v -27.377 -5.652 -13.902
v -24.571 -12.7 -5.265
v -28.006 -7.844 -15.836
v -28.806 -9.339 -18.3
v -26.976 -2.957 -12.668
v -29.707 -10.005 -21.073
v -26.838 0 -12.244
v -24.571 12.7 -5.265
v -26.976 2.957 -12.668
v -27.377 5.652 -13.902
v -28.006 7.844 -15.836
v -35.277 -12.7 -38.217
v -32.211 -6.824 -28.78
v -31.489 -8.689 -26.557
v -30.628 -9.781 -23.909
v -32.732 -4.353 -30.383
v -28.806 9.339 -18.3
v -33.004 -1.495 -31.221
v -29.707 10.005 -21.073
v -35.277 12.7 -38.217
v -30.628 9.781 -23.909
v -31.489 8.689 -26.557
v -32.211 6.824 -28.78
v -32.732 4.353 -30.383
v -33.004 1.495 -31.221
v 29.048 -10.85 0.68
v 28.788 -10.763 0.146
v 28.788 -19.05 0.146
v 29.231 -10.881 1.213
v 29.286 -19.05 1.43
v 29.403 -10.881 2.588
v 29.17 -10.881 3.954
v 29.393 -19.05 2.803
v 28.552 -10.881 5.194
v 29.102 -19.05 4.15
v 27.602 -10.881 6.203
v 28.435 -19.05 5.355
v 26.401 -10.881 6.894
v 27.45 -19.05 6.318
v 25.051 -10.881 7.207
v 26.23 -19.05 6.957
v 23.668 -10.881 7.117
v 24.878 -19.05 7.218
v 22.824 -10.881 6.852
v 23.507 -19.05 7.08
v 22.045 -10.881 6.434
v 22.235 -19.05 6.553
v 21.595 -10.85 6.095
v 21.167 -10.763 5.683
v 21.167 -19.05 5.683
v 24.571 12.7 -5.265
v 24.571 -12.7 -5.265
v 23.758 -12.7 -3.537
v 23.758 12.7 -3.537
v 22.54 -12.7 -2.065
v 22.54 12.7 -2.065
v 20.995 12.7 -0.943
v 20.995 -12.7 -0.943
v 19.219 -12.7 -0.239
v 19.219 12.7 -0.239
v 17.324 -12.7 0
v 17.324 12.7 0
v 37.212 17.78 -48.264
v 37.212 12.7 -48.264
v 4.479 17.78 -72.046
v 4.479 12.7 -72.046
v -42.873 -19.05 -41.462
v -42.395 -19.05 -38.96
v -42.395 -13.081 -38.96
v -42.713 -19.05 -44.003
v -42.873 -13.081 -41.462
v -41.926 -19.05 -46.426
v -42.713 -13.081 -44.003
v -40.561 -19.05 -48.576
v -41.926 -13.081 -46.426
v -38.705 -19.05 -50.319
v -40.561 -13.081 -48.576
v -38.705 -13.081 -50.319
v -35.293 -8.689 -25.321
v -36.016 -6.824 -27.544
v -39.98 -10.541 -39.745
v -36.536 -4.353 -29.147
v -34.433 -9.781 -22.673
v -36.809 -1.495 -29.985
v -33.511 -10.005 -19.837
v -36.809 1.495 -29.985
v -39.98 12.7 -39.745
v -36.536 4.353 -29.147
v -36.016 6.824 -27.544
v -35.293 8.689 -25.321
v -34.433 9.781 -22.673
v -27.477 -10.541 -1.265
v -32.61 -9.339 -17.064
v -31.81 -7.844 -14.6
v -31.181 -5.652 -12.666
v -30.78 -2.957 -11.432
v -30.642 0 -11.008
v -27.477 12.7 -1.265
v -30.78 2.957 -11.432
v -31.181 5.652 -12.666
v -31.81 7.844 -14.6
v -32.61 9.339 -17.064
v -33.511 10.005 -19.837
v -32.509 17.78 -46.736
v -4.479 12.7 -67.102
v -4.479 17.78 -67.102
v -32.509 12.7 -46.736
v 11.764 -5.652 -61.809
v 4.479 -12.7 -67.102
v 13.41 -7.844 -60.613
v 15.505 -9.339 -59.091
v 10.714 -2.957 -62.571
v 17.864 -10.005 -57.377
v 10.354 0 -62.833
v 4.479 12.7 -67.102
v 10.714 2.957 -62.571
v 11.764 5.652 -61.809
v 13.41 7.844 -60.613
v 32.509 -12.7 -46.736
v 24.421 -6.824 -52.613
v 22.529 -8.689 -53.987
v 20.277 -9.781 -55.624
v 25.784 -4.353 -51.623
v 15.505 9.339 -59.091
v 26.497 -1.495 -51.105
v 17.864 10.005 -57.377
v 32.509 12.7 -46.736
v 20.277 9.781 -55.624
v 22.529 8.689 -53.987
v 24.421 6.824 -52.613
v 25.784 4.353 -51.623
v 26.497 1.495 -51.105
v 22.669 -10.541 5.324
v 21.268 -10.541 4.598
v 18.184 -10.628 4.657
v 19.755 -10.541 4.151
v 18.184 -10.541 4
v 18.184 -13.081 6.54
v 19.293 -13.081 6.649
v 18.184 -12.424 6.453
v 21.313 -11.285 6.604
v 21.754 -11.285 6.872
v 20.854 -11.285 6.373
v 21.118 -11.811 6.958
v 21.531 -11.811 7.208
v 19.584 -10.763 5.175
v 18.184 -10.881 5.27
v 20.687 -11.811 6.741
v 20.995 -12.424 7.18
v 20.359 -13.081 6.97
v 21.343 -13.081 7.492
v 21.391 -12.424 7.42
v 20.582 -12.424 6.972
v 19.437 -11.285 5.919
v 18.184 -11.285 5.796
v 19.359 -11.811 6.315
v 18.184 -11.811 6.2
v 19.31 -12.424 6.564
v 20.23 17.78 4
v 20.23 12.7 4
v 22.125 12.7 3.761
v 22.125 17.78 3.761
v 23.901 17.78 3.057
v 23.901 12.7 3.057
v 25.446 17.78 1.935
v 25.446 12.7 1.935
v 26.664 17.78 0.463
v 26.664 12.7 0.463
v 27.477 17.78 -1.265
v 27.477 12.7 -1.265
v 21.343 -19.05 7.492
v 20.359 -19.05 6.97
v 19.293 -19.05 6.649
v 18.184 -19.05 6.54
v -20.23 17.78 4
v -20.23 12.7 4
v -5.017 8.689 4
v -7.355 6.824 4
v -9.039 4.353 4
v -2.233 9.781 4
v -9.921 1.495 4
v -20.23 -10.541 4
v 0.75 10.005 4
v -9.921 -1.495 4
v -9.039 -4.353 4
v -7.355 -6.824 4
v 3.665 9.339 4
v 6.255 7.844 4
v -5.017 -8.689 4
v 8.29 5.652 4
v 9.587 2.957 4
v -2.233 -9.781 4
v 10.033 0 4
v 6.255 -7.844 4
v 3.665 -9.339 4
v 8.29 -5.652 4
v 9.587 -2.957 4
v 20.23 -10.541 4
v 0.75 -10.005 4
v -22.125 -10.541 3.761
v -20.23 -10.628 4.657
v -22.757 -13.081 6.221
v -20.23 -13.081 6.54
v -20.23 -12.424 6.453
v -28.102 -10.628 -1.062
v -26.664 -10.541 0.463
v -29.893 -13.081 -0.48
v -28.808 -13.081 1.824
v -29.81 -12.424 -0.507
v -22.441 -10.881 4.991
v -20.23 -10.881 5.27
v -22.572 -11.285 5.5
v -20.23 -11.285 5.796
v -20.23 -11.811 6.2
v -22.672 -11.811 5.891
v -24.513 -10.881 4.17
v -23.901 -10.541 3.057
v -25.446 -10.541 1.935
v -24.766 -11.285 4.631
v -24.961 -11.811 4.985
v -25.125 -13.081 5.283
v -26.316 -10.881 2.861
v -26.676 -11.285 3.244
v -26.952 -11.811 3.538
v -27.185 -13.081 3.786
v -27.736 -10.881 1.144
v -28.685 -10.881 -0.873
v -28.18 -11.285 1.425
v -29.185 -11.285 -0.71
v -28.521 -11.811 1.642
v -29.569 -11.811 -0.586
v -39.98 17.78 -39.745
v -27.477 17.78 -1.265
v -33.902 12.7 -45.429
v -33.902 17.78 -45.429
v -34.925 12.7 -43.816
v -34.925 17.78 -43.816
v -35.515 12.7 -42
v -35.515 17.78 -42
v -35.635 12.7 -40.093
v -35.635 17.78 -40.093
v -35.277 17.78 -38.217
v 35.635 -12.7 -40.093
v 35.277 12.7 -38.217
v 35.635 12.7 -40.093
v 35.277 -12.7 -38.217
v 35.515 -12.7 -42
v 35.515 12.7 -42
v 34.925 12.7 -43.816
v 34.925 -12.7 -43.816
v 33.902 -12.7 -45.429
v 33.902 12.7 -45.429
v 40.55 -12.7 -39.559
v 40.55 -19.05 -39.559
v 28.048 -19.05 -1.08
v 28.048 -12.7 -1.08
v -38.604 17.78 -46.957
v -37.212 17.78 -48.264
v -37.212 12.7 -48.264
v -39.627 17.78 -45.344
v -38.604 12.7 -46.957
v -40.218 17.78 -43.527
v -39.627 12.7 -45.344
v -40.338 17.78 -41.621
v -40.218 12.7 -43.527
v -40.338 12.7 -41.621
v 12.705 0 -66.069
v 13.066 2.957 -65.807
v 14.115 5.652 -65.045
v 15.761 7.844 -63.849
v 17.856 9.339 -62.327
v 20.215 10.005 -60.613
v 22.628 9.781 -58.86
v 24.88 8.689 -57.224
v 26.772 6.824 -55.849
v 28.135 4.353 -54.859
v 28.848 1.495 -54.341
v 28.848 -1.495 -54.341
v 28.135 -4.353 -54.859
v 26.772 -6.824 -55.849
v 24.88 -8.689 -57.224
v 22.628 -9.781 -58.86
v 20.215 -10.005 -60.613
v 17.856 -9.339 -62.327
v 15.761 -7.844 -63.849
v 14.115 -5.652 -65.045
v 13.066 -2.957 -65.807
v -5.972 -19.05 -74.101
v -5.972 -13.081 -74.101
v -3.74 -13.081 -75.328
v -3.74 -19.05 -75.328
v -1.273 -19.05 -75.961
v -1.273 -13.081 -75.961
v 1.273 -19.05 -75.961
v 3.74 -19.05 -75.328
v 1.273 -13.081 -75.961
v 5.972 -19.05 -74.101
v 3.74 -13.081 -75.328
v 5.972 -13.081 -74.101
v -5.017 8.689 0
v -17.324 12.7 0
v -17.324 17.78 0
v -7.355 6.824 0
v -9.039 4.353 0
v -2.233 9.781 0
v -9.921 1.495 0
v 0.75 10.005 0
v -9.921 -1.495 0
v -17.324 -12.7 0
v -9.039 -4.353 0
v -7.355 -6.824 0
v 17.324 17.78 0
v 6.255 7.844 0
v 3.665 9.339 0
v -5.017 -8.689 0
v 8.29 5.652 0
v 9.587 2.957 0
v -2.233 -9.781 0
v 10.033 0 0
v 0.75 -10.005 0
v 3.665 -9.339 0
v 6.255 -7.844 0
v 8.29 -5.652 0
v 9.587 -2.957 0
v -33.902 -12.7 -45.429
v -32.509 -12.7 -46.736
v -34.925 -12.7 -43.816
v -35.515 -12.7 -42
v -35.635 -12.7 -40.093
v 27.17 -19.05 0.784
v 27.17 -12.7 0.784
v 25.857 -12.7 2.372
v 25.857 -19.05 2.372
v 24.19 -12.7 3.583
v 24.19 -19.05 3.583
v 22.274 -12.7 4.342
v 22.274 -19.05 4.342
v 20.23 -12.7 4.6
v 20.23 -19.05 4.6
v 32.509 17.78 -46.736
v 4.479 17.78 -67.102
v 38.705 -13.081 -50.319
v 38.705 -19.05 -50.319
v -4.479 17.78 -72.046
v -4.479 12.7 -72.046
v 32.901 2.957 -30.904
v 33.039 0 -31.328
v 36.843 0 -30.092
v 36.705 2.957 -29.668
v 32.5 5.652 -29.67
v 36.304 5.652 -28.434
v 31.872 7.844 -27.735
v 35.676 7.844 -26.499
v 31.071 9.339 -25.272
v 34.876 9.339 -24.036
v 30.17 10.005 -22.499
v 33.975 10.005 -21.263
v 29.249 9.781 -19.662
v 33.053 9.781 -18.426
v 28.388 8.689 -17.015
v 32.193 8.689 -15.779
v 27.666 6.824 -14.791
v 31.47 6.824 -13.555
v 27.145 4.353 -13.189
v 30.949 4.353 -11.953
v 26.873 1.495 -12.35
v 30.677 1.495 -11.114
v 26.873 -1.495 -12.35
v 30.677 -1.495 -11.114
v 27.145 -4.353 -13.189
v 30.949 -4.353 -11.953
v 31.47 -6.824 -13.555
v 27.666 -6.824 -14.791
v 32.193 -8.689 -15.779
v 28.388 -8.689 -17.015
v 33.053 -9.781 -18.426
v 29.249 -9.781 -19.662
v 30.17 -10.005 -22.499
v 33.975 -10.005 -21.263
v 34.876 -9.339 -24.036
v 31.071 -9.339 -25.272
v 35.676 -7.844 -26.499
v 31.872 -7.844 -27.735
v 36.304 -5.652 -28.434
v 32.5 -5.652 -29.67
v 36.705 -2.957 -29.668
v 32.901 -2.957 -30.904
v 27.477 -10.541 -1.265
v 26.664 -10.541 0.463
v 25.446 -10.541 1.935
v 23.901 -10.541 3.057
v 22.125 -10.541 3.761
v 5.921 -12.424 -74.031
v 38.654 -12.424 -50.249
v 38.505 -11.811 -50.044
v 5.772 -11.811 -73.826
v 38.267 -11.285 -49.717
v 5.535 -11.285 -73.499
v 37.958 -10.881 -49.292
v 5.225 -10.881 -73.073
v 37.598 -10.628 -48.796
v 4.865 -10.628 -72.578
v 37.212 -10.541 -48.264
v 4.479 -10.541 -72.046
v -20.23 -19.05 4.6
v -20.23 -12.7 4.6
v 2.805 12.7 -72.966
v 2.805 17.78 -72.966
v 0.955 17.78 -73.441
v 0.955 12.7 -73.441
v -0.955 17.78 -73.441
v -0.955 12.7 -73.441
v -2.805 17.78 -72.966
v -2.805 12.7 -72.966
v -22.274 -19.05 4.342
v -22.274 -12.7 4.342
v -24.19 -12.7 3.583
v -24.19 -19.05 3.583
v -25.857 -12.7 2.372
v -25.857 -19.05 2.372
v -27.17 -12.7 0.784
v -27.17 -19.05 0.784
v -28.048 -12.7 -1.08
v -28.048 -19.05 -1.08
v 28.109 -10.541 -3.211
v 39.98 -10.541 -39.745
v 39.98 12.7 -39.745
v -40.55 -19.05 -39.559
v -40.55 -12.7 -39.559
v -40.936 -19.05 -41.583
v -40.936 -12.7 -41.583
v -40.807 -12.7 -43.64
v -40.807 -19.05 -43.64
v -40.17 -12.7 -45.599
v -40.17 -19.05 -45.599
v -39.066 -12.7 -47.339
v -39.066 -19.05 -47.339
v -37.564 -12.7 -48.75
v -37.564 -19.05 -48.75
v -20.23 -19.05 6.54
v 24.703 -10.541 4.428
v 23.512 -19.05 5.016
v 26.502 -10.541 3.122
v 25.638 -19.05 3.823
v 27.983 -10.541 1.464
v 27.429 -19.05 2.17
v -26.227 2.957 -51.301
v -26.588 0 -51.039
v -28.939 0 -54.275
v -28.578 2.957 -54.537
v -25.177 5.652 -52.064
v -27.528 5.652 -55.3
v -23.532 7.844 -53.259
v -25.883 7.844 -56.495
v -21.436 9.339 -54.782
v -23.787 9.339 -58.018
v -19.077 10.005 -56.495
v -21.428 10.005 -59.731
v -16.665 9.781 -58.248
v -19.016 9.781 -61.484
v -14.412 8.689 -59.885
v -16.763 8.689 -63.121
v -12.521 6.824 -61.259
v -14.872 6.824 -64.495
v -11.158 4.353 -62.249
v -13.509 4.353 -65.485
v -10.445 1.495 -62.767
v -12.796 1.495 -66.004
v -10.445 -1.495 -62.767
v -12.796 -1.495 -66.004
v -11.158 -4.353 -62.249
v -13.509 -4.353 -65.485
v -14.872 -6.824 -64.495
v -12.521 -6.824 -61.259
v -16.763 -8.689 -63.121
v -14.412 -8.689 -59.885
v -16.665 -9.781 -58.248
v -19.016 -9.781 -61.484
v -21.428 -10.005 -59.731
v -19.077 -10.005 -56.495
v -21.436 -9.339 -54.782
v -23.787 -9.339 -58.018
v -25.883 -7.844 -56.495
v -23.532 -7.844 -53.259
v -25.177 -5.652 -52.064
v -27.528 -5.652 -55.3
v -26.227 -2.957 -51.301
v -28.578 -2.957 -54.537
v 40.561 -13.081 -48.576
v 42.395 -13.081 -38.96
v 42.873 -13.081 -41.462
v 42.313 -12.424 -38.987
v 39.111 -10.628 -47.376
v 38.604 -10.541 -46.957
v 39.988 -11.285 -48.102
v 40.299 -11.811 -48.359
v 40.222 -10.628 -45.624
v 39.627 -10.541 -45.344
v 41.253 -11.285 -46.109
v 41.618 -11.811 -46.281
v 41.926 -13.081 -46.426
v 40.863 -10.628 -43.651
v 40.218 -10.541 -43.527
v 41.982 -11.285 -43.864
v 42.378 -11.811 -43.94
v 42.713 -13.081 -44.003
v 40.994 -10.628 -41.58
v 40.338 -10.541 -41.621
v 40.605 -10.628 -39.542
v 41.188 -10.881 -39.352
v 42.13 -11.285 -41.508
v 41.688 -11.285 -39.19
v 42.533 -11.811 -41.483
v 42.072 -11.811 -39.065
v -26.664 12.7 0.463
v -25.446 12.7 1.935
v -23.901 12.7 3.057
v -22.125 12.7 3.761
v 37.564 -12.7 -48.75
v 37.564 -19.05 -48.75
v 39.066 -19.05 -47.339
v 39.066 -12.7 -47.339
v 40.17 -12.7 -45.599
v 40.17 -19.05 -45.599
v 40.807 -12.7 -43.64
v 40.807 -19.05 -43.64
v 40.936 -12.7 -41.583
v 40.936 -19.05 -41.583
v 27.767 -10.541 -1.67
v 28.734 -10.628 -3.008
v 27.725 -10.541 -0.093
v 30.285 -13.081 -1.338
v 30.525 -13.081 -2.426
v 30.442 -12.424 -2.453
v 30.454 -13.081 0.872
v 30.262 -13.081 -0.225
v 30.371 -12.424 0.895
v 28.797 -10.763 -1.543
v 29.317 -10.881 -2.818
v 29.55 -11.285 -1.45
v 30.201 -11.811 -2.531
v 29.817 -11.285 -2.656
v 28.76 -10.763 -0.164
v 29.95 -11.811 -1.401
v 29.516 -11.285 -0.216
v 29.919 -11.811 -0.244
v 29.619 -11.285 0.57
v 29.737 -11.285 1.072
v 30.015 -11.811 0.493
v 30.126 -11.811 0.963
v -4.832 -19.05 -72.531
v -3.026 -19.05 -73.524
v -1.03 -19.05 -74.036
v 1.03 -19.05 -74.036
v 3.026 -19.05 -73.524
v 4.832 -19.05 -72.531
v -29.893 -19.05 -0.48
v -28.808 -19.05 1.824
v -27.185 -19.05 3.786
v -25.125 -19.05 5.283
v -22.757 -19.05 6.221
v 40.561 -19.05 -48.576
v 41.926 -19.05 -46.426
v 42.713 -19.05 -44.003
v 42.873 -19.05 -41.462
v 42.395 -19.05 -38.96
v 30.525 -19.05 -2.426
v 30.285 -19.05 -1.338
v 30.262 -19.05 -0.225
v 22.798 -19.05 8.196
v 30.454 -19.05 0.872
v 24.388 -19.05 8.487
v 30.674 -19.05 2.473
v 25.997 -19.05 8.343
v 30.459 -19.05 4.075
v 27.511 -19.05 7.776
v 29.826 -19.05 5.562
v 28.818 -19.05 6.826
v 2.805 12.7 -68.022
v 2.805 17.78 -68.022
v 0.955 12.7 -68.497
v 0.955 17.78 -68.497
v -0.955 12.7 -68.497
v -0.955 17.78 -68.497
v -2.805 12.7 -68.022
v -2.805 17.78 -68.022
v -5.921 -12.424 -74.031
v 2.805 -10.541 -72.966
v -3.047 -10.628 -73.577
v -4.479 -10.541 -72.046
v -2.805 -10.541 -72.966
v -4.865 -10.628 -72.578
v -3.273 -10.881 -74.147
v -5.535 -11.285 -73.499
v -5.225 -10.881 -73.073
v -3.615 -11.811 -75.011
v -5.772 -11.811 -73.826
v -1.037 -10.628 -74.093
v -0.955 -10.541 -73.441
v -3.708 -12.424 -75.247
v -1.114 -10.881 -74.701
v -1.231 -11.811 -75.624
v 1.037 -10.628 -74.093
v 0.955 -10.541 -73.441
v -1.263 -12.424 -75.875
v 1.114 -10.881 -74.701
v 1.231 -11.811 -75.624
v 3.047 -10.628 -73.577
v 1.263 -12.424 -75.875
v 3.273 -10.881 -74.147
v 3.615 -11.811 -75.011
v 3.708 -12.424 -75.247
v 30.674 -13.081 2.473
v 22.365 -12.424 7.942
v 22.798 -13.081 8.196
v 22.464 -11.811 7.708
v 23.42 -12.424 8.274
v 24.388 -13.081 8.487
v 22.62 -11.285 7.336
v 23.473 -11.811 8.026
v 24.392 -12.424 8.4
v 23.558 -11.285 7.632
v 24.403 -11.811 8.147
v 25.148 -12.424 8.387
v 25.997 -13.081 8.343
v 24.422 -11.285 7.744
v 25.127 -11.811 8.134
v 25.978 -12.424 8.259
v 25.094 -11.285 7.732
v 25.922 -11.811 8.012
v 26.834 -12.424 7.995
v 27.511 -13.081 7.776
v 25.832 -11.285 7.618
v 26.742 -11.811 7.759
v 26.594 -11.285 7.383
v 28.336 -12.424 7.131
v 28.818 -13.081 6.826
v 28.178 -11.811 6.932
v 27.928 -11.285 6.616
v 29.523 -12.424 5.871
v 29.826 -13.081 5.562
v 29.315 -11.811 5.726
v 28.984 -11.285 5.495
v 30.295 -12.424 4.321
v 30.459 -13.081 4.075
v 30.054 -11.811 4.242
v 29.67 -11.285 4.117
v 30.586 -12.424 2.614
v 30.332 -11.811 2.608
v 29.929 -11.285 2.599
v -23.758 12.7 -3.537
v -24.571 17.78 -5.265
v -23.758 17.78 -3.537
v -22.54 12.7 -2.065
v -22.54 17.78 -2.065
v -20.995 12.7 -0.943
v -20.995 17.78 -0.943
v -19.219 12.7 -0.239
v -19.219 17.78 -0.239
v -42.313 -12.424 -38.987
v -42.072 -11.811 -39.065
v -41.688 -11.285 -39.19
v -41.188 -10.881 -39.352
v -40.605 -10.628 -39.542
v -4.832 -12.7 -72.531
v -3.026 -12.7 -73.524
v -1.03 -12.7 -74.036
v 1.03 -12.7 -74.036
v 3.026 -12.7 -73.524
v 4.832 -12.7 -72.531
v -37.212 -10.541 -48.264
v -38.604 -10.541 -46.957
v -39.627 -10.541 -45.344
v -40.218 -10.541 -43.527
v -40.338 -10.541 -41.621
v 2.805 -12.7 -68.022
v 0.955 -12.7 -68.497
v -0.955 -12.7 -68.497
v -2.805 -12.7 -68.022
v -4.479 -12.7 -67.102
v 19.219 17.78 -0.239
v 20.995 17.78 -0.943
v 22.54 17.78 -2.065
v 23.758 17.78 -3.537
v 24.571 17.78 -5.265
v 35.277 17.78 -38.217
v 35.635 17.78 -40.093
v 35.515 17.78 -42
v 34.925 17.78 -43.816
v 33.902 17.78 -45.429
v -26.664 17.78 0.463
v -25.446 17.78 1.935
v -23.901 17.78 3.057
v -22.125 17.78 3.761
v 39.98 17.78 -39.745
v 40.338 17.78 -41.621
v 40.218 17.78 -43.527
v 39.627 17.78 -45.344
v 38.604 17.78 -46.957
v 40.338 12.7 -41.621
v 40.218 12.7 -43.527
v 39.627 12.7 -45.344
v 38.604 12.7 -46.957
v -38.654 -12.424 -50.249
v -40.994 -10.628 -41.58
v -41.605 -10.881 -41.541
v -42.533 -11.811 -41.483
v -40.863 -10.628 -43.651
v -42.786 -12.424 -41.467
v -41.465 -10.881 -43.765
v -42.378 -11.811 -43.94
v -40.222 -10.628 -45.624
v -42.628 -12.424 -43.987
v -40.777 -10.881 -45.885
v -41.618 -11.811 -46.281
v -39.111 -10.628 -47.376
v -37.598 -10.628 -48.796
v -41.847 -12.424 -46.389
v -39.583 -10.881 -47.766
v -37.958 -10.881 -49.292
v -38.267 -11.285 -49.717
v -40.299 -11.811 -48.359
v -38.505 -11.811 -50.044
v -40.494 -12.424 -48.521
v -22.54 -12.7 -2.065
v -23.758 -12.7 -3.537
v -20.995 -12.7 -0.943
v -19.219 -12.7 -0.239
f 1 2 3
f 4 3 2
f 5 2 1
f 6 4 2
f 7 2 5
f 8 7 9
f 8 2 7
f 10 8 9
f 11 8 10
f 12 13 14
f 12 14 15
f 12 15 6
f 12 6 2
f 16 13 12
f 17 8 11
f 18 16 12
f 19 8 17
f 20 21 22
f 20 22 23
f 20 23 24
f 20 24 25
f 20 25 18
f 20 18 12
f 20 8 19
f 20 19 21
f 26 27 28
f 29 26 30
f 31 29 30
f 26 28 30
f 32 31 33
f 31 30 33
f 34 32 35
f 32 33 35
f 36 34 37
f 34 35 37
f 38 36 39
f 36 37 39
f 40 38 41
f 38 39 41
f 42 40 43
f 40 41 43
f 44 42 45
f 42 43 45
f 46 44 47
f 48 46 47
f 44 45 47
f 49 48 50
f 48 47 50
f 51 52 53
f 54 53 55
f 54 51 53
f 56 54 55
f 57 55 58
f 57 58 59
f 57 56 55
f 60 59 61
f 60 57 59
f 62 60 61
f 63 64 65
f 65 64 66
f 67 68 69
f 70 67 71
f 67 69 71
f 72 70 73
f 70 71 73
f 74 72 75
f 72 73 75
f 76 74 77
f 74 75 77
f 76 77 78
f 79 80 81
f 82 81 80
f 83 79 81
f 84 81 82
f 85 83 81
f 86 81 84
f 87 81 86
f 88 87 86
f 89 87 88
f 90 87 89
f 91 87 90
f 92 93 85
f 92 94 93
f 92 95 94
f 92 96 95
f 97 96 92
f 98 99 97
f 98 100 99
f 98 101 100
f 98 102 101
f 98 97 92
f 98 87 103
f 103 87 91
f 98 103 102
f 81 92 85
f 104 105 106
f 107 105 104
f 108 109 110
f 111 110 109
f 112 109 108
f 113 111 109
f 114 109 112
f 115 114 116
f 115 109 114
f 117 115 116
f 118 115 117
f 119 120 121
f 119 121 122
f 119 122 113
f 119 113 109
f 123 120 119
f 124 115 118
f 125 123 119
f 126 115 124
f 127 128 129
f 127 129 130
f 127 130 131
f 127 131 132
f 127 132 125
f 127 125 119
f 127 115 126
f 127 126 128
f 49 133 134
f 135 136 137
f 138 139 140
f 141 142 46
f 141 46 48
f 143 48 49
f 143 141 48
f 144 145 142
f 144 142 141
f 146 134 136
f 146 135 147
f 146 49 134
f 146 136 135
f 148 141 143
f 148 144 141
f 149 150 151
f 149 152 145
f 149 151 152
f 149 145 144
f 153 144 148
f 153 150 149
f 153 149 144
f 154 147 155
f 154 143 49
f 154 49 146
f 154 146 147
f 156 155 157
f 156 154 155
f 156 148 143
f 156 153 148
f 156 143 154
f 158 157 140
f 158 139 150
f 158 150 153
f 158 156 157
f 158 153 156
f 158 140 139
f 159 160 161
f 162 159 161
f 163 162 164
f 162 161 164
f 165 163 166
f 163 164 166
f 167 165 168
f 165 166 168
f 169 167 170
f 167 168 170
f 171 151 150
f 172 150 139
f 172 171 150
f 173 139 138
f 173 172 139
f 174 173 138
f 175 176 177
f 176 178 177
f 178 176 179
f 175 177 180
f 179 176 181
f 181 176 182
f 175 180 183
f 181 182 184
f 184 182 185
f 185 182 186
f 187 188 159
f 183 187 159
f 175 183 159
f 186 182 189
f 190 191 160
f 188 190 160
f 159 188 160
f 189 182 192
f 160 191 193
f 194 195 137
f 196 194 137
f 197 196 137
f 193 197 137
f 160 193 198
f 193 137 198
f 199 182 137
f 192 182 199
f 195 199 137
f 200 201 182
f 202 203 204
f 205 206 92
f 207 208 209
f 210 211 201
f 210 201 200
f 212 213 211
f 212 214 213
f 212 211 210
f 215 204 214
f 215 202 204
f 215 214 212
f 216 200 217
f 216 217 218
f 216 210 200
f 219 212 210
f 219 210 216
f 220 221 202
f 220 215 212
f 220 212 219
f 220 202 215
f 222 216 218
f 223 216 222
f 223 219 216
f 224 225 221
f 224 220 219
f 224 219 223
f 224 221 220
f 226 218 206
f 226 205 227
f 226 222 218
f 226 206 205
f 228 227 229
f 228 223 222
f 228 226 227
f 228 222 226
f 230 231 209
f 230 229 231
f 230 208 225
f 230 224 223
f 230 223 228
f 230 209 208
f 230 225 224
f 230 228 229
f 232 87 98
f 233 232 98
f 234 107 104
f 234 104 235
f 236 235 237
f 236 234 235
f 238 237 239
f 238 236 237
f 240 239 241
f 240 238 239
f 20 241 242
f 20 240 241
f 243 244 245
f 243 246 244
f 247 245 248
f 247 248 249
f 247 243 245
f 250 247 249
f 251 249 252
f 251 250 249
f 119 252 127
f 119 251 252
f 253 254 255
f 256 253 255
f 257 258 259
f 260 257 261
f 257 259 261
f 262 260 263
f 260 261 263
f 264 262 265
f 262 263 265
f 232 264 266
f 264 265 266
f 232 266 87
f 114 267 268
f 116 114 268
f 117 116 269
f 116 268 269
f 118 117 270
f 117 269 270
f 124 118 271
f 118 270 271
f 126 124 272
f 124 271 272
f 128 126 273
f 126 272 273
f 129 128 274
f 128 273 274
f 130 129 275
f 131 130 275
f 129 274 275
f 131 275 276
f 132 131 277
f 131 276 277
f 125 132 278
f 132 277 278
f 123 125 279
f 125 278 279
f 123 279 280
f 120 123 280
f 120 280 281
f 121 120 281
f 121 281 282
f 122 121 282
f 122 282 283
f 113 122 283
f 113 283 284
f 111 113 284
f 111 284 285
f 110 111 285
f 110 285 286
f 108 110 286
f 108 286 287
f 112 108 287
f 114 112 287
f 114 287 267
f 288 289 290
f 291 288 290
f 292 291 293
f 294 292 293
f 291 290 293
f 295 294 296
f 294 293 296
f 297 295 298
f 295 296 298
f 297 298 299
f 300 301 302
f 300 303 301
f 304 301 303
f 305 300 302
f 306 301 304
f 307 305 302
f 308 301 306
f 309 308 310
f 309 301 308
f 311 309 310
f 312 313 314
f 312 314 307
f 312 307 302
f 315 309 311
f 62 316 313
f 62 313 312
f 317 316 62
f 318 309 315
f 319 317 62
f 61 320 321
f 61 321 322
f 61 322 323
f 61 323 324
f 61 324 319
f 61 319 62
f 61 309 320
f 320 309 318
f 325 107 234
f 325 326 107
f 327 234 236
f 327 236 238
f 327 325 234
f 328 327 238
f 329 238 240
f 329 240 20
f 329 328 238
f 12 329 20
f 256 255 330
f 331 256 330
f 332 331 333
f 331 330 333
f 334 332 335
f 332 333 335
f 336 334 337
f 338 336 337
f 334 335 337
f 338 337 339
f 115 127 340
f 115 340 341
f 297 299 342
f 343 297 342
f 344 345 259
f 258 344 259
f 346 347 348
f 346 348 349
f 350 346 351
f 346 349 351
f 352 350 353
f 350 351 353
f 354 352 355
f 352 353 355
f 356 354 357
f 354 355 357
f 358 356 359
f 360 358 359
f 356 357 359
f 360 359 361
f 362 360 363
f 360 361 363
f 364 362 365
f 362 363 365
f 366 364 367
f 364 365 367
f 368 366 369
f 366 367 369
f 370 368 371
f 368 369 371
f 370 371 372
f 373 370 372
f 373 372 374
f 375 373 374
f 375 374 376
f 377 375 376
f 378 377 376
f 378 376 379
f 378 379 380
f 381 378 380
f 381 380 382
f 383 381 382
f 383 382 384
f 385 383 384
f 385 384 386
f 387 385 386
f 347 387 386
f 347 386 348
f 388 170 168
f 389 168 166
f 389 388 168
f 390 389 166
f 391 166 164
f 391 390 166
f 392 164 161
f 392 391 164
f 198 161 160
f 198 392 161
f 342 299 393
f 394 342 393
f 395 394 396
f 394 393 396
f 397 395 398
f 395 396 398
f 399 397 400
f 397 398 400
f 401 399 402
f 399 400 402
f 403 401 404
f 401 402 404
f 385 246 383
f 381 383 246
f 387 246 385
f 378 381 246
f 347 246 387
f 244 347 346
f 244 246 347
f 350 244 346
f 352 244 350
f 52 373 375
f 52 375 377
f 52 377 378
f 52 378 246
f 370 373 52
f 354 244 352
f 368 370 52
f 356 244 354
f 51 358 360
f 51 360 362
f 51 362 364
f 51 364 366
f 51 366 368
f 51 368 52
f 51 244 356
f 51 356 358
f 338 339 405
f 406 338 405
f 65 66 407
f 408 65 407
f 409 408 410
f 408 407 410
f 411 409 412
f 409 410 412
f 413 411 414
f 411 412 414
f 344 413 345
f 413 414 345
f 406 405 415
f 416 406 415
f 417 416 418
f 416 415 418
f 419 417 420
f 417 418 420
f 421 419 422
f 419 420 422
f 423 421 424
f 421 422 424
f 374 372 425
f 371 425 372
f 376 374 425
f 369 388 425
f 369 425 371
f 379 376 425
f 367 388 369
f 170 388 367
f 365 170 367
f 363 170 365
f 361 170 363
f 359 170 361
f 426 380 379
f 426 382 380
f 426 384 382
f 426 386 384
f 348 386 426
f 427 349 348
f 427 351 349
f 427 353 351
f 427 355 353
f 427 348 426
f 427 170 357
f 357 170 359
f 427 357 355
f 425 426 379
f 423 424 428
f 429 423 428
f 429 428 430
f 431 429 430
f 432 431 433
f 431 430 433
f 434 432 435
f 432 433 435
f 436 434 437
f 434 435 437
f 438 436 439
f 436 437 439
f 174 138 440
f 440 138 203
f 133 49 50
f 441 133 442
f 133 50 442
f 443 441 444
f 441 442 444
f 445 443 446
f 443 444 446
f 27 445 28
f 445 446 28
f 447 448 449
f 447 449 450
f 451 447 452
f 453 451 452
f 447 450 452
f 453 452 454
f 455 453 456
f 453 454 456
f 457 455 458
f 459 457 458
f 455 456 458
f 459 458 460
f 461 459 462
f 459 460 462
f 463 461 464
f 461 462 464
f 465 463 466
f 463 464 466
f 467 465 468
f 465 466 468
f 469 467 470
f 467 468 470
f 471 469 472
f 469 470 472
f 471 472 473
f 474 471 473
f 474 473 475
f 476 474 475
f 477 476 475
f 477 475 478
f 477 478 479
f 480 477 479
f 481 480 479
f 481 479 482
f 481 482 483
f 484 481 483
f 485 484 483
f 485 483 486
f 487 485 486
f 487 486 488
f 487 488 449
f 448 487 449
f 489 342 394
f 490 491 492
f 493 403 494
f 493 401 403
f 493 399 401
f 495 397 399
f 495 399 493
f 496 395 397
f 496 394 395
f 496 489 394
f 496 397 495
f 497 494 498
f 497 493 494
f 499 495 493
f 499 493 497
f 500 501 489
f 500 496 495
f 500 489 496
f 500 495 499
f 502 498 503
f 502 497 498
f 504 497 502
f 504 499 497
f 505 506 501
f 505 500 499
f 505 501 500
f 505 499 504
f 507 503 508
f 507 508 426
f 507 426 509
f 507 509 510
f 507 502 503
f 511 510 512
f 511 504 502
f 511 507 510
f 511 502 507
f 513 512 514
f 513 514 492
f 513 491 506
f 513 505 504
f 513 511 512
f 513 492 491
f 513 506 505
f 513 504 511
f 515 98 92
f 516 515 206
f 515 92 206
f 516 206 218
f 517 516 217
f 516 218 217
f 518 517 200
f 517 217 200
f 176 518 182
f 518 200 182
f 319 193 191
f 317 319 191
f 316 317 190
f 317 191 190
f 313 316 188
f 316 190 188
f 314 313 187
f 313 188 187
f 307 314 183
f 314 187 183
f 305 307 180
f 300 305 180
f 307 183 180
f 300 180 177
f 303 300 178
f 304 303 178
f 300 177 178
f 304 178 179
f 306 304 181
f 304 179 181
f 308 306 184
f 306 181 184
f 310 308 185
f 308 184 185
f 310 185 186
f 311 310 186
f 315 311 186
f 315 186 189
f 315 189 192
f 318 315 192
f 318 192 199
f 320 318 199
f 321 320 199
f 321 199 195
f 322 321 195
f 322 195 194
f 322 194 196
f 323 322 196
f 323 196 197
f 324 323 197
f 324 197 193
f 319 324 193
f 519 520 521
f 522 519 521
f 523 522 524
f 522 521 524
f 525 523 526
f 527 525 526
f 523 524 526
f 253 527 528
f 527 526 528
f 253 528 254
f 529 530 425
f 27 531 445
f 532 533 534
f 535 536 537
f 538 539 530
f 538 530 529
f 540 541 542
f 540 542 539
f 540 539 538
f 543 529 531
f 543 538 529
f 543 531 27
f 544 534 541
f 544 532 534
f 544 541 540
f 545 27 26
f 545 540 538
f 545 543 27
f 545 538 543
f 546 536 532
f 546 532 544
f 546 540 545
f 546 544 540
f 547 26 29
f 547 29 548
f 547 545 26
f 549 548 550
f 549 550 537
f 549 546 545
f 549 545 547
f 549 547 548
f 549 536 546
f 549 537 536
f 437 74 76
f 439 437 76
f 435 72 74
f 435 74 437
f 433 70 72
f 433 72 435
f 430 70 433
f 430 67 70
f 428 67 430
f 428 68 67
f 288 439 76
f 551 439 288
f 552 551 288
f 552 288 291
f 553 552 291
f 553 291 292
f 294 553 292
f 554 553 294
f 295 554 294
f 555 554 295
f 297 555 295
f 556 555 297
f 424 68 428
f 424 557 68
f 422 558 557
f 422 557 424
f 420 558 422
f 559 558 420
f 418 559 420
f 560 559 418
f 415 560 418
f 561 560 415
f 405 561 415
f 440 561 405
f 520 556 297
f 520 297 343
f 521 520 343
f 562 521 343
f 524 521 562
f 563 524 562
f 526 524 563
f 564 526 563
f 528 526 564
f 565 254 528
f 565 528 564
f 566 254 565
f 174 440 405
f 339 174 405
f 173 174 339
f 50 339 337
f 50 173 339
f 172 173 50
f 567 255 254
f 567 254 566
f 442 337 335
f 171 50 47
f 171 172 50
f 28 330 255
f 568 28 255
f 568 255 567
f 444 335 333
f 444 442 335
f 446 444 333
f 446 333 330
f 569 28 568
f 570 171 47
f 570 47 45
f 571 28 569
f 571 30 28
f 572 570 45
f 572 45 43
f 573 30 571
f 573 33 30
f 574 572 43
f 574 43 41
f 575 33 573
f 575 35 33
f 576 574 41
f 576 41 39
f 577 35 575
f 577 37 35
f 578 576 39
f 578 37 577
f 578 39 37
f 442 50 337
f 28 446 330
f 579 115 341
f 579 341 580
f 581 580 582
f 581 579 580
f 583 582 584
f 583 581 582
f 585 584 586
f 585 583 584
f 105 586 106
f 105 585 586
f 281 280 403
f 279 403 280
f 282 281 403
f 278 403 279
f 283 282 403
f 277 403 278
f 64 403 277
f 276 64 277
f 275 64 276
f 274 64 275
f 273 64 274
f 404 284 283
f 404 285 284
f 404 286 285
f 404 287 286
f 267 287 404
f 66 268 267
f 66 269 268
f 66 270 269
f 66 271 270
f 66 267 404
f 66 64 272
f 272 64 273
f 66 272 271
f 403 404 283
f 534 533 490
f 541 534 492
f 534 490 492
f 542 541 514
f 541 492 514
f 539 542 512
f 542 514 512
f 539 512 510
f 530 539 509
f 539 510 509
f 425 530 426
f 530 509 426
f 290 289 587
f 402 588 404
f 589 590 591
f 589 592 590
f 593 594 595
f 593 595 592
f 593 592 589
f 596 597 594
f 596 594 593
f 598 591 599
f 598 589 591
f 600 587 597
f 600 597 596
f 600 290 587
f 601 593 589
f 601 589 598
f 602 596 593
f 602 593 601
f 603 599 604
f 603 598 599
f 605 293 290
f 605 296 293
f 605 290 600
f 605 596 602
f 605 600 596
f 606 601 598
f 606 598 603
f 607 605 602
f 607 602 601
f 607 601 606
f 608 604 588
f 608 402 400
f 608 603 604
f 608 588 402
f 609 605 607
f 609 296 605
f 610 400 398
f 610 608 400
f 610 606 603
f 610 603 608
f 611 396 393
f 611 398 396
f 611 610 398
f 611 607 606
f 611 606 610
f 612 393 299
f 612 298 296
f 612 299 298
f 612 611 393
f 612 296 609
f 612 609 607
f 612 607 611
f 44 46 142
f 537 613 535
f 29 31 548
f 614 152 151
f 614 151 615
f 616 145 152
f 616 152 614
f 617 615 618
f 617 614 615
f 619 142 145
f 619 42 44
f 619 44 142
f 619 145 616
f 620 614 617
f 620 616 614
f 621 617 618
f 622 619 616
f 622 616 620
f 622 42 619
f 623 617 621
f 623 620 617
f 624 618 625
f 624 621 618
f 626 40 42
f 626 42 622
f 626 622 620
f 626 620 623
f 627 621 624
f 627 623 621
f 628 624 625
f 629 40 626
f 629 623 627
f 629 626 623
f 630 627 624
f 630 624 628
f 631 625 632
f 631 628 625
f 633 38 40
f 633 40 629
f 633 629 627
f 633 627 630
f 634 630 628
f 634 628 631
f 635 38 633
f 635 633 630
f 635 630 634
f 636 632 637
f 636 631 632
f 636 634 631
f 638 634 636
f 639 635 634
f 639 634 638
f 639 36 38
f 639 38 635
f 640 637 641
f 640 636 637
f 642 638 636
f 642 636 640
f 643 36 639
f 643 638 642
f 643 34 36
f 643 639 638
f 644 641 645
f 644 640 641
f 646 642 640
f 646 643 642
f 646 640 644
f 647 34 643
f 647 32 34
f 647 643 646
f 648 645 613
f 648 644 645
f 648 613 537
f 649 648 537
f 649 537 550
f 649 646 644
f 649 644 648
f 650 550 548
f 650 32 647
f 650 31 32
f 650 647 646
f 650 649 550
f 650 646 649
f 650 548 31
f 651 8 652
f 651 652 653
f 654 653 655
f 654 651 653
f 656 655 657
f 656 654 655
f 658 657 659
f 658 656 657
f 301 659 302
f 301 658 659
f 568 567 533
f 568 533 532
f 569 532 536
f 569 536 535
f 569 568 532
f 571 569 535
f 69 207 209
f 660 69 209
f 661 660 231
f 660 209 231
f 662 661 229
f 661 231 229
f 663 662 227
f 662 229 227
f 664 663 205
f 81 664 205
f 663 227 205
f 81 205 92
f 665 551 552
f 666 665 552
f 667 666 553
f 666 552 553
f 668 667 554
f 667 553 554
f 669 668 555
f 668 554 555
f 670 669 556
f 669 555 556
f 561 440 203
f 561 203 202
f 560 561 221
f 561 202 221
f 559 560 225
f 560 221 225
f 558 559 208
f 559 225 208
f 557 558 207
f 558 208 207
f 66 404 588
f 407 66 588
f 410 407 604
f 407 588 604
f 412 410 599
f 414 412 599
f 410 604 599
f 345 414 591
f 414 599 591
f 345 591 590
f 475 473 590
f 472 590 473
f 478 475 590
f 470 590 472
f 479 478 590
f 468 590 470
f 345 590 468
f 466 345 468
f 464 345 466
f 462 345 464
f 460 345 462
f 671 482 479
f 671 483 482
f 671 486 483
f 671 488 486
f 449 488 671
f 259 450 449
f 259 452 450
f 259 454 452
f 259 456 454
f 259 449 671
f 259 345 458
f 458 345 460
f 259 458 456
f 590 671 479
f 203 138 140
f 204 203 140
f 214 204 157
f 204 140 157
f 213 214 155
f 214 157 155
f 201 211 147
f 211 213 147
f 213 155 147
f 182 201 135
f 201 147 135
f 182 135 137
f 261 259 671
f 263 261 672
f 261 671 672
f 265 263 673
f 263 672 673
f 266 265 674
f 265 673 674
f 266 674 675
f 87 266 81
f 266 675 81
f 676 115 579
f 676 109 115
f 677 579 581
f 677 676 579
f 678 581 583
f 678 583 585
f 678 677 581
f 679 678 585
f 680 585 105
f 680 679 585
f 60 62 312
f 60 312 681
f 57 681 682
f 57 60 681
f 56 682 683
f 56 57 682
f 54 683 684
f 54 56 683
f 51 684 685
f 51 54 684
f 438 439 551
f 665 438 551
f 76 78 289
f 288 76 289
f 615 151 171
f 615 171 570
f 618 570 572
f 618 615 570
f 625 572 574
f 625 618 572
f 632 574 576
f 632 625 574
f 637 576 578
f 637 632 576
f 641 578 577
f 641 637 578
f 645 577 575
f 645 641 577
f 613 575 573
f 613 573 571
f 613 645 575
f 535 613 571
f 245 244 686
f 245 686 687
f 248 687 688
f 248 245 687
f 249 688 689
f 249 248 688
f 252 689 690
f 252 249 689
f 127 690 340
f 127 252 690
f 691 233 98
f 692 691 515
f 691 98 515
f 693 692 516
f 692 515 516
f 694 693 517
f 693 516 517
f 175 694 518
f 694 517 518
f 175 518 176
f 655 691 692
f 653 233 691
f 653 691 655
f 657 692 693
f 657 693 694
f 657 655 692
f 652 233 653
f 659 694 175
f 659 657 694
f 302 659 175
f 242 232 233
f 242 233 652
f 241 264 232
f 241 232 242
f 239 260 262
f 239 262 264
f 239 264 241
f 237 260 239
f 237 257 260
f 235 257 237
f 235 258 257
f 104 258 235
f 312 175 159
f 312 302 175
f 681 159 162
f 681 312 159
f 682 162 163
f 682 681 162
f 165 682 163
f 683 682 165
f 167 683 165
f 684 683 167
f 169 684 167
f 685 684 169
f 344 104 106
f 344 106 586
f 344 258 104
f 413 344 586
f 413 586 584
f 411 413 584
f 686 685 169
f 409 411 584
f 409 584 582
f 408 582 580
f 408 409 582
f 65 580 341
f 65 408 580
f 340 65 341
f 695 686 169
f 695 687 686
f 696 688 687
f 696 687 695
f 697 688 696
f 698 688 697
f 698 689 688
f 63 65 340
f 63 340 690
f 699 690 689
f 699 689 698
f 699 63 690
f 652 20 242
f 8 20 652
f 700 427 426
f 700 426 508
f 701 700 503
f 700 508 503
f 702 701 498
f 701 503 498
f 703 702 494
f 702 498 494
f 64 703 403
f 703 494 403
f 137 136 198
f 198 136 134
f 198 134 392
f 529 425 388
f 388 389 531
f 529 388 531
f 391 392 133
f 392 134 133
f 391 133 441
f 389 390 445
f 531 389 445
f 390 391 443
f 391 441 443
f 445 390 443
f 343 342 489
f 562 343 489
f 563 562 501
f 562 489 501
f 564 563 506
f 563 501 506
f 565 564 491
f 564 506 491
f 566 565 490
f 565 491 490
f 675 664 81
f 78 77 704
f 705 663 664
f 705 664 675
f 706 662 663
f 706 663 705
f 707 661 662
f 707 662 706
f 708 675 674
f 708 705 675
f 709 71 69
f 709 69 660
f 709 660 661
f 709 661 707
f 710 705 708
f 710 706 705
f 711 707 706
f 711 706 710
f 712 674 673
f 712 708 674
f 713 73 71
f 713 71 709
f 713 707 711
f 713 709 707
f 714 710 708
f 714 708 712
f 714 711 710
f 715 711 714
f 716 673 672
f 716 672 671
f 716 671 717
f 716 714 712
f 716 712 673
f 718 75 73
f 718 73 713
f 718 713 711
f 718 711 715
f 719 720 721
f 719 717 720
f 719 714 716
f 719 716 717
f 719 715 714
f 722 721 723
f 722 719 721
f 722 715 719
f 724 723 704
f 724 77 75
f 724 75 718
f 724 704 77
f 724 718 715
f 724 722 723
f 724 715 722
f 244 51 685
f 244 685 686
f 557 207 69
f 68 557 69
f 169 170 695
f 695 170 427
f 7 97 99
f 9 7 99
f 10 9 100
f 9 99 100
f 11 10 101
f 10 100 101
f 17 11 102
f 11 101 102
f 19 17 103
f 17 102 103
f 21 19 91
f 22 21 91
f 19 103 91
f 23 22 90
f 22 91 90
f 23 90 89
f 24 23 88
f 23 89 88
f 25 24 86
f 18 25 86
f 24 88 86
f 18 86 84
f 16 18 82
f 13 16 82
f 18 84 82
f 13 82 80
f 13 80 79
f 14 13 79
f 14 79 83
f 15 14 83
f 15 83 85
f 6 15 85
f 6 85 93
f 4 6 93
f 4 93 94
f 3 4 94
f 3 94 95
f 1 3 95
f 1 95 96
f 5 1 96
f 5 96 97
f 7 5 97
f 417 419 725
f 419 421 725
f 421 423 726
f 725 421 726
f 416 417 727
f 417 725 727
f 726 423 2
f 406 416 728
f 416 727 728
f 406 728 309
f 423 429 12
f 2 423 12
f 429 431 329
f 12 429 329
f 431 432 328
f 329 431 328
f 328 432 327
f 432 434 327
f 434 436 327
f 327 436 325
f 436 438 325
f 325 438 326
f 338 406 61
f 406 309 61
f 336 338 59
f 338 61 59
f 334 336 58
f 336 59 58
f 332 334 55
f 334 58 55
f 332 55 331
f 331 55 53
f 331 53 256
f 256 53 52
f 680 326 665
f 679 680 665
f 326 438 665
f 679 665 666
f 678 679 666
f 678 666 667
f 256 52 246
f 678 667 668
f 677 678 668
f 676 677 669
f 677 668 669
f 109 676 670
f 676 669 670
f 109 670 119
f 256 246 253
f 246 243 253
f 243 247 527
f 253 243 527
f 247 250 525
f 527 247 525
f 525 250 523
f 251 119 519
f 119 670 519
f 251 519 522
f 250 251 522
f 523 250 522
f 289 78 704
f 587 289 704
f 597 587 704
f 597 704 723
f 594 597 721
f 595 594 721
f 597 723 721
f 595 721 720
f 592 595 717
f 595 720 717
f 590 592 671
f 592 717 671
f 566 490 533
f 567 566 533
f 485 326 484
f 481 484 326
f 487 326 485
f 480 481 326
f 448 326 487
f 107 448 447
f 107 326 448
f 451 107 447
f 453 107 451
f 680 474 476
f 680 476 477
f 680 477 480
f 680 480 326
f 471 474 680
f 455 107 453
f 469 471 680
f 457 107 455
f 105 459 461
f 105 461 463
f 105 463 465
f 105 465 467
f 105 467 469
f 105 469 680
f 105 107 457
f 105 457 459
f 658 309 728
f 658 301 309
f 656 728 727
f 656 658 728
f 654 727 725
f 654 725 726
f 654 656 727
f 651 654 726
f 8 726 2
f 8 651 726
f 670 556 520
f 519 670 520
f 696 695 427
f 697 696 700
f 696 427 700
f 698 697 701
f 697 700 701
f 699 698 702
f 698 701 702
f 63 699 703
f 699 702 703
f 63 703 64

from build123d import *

# Parameters (mm, degrees)
SKETCH1_W                = 45.72
SKETCH1_H                = 25.4
SKETCH1_R                = 9.75
BOSS_EXTRUDE1_DEPTH      = 4
BOSS_EXTRUDE2_DEPTH      = 25.4
SKETCH3_R                = 10.033
CUT_EXTRUDE1_DEPTH       = 11.62
CIRPATTERN1_COUNT        = 5
FILLET1_R                = 7.62
BOSS_EXTRUDE3_DEPTH      = 5.08
BOSS_EXTRUDE4_DEPTH      = 6.35
BOSS_EXTRUDE4_DEPTH_BACK = 2.159
BOSS_EXTRUDE5_START      = -8.509
BOSS_EXTRUDE5_DEPTH      = 8.509
CUT_EXTRUDE4_DEPTH       = 12.192
FILLET5_R                = 5.715
FILLET6_R                = 2.54
CUT_EXTRUDE5_DEPTH       = 6.35


with BuildPart() as part:
    # Sketch1 → Boss-Extrude1 (new body)
    with BuildSketch(Plane.XY):
        Rectangle(SKETCH1_W, SKETCH1_H)
        Circle(SKETCH1_R, mode=Mode.SUBTRACT)
    extrude(amount=BOSS_EXTRUDE1_DEPTH)

    # Sketch2 → Boss-Extrude2 (add)
    with BuildSketch(Plane(origin=(0, 12.7, 0), x_dir=(1, 0, 0), z_dir=(0, 1, 0))):
        Polygon((36.988256983, 43.482303925), (22.86, 0), (22.86, -4), (25.766170112, -4), (41.690539001, 45.01016797), (0, 75.30011757), (-41.690539001, 45.01016797), (-25.766170112, -4), (-22.86, -4), (-22.86, 0), (-36.988256983, 43.482303925), (0, 70.35584566), align=None)
    extrude(amount=-BOSS_EXTRUDE2_DEPTH)

    # Sketch3 → Cut-Extrude1 (cut)
    with BuildSketch(Plane.XY.offset(4)):
        Circle(SKETCH3_R)
    cut_extrude1 = extrude(amount=-CUT_EXTRUDE1_DEPTH, mode=Mode.SUBTRACT)

    # CirPattern1: Cut-Extrude1 ×5 about axis
    cirpattern1_axis = Axis((0, 12.7, -31.513299997), (0, -1, 0))
    for i in range(1, CIRPATTERN1_COUNT):
        add(cut_extrude1.rotate(cirpattern1_axis, i * 360 / CIRPATTERN1_COUNT), mode=Mode.SUBTRACT)

    # Fillet1
    fillet1_edges = [part.edges().sort_by_distance(p)[0] for p in [
        (0, 0, -75.30011757),
        (41.690539001, 0, -45.01016797),
        (25.766170112, 0, 4),
        (36.988256983, 0, -43.482303925),
        (0, 0, -70.35584566),
        (-36.988256983, 0, -43.482303925),
        (-25.766170112, 0, 4),
        (-41.690539001, 0, -45.01016797),
        (-22.86, 0, 0),
        (22.86, 0, 0),
    ]]
    fillet(fillet1_edges, radius=FILLET1_R)

    # Sketch6 → Boss-Extrude3 (add)
    with BuildSketch(Plane(origin=(0, 12.7, 0), x_dir=(1, 0, 0), z_dir=(0, 1, 0))):
        with BuildLine():
            Line((-20.229916049, -4), (20.229916049, -4))
            ThreePointArc((20.229916049, -4), (24.708839671, -2.544709497), (27.476966703, 1.265290503))
            Line((27.476966703, 1.265290503), (39.97974241, 39.744877467))
            ThreePointArc((39.97974241, 39.744877467), (39.97974241, 44.454296461), (37.211615379, 48.264296461))
            Line((37.211615379, 48.264296461), (4.478923622, 72.045989078))
            ThreePointArc((4.478923622, 72.045989078), (0, 73.501279581), (-4.478923622, 72.045989078))
            Line((-4.478923622, 72.045989078), (-37.211615379, 48.264296461))
            ThreePointArc((-37.211615379, 48.264296461), (-39.97974241, 44.454296461), (-39.97974241, 39.744877467))
            Line((-39.97974241, 39.744877467), (-27.476966703, 1.265290503))
            ThreePointArc((-27.476966703, 1.265290503), (-24.708839671, -2.544709497), (-20.229916049, -4))
        make_face()
        with BuildLine():
            Line((24.570796591, 5.265290503), (35.277460392, 38.217013422))
            ThreePointArc((35.277460392, 38.217013422), (35.277460392, 42.926432416), (32.50933336, 46.736432416))
            Line((32.50933336, 46.736432416), (4.478923622, 67.101717168))
            ThreePointArc((4.478923622, 67.101717168), (0, 68.557007671), (-4.478923622, 67.101717168))
            Line((-4.478923622, 67.101717168), (-32.50933336, 46.736432416))
            ThreePointArc((-32.50933336, 46.736432416), (-35.277460392, 42.926432416), (-35.277460392, 38.217013422))
            Line((-35.277460392, 38.217013422), (-24.570796591, 5.265290503))
            ThreePointArc((-24.570796591, 5.265290503), (-21.802669559, 1.455290503), (-17.323745937, 0))
            Line((-17.323745937, 0), (17.323745937, 0))
            ThreePointArc((17.323745937, 0), (21.802669559, 1.455290503), (24.570796591, 5.265290503))
        make_face(mode=Mode.SUBTRACT)
    extrude(amount=BOSS_EXTRUDE3_DEPTH)

    # Sketch8 → Boss-Extrude4 (add, two sides: drawn at the far end of the back side and taken through both)
    with BuildSketch(Plane.XZ.offset(12.7).offset(-BOSS_EXTRUDE4_DEPTH_BACK)):
        with BuildLine():
            Line((5.971898163, -74.100892244), (38.70458992, -50.319199627))
            ThreePointArc((38.70458992, -50.319199627), (42.395425962, -45.239199627), (42.395425962, -38.959974301))
            Line((42.395425962, -38.959974301), (29.892650254, -0.480387337))
            ThreePointArc((29.892650254, -0.480387337), (26.201814212, 4.599612663), (20.229916049, 6.54))
            Line((20.229916049, 6.54), (-20.229916049, 6.54))
            ThreePointArc((-20.229916049, 6.54), (-26.201814212, 4.599612663), (-29.892650254, -0.480387337))
            Line((-29.892650254, -0.480387337), (-42.395425962, -38.959974301))
            ThreePointArc((-42.395425962, -38.959974301), (-42.395425962, -45.239199627), (-38.70458992, -50.319199627))
            Line((-38.70458992, -50.319199627), (-5.971898163, -74.100892244))
            ThreePointArc((-5.971898163, -74.100892244), (0, -76.041279581), (5.971898163, -74.100892244))
        make_face()
        with BuildLine():
            Line((39.97974241, -39.744877467), (27.476966703, -1.265290503))
            ThreePointArc((27.476966703, -1.265290503), (24.708839671, 2.544709497), (20.229916049, 4))
            Line((20.229916049, 4), (-20.229916049, 4))
            ThreePointArc((-20.229916049, 4), (-24.708839671, 2.544709497), (-27.476966703, -1.265290503))
            Line((-27.476966703, -1.265290503), (-39.97974241, -39.744877467))
            ThreePointArc((-39.97974241, -39.744877467), (-39.97974241, -44.454296461), (-37.211615379, -48.264296461))
            Line((-37.211615379, -48.264296461), (-4.478923622, -72.045989078))
            ThreePointArc((-4.478923622, -72.045989078), (0, -73.501279581), (4.478923622, -72.045989078))
            Line((4.478923622, -72.045989078), (37.211615379, -48.264296461))
            ThreePointArc((37.211615379, -48.264296461), (39.97974241, -44.454296461), (39.97974241, -39.744877467))
        make_face(mode=Mode.SUBTRACT)
    extrude(amount=BOSS_EXTRUDE4_DEPTH + BOSS_EXTRUDE4_DEPTH_BACK)

    # Sketch11 → Boss-Extrude5 (add)
    with BuildSketch(Plane.XZ.offset(19.05).offset(BOSS_EXTRUDE5_START)):
        with BuildLine():
            Line((19.948787859, 5.414930333), (27.190045273, 1.56775587))
            Line((27.190045273, 1.56775587), (29.892650254, -0.480387337))
            ThreePointArc((29.892650254, -0.480387337), (26.201814212, 4.599612663), (20.229916049, 6.54))
            Line((20.229916049, 6.54), (19.948787859, 5.414930333))
        make_face()
        with BuildLine():
            ThreePointArc((20.229916049, 6.54), (28.196740294, 7.345392854), (29.892650254, -0.480387337))
            ThreePointArc((29.892650254, -0.480387337), (26.201814212, 4.599612663), (20.229916049, 6.54))
        make_face()
    extrude(amount=BOSS_EXTRUDE5_DEPTH)

    # Sketch12 → Cut-Extrude4 (cut)
    with BuildSketch(Plane.XZ.offset(19.05)):
        with BuildLine():
            ThreePointArc((28.787792432, 0.145862767), (27.450253023, 6.317941272), (21.166935135, 5.682739694))
            ThreePointArc((21.166935135, 5.682739694), (25.637505825, 3.822908801), (28.787792432, 0.145862767))
        make_face()
    extrude(amount=-CUT_EXTRUDE4_DEPTH, mode=Mode.SUBTRACT)

    # Fillet5
    fillet5_edges = [part.edges().sort_by_distance(p)[0] for p in [
        (20.229916049, -14.7955, 6.54),
        (29.892650254, -14.7955, -0.480387337),
    ]]
    fillet(fillet5_edges, radius=FILLET5_R)

    # Fillet6
    # the kernel refuses this fillet: 2.54 mm, written as the material it takes off along each edge
    with BuildSketch(Plane(origin=(32.732691756, -10.541, -42.099586964), x_dir=(0.5877852522924727, 0, -0.8090169943749478), z_dir=(-0.8090169943749478, 0, -0.5877852522924727))) as fillet6_piece_1:
        with BuildLine():
            CenterArc((10.16 - FILLET6_R, FILLET6_R), FILLET6_R, 270, 90)
            Line((10.16 - FILLET6_R, 0), (10.16, 0))
            Line((10.16, 0), (10.16, FILLET6_R))
        make_face()
    revolve(axis=Axis((32.732691756, -10.541, -42.099586964), (0, -1, 0)), revolution_arc=72, mode=Mode.SUBTRACT)
    with BuildSketch(Plane(origin=(5.971898163, -10.541, -74.100892244), x_dir=(0, -1, 0), z_dir=(0.8090169943749487, 0, 0.5877852522924716)), Plane(origin=(-38.70458992, -10.541, -50.319199627), x_dir=(0, -1, 0), z_dir=(0.8090169943749469, 0, -0.5877852522924739)), Plane(origin=(-29.892650254, -10.541, -0.480387337), x_dir=(0, -1, 0), z_dir=(-0.30901699437495056, 0, -0.9510565162951526))) as fillet6_piece_2:
        with BuildLine():
            CenterArc((FILLET6_R, -FILLET6_R), FILLET6_R, 90, 90)
            Line((0, -FILLET6_R), (0, 0))
            Line((0, 0), (FILLET6_R, 0))
        make_face()
    extrude(amount=40.459832097, mode=Mode.SUBTRACT)
    with BuildSketch(Plane(origin=(0, -10.541, -65.881279581), x_dir=(-0.5877852522924719, 0, -0.8090169943749482), z_dir=(-0.8090169943749482, 0, 0.5877852522924719))) as fillet6_piece_3:
        with BuildLine():
            CenterArc((10.16 - FILLET6_R, FILLET6_R), FILLET6_R, 270, 90)
            Line((10.16 - FILLET6_R, 0), (10.16, 0))
            Line((10.16, 0), (10.16, FILLET6_R))
        make_face()
    revolve(axis=Axis((0, -10.541, -65.881279581), (0, -1, 0)), revolution_arc=72, mode=Mode.SUBTRACT)
    with BuildSketch(Plane(origin=(-32.732691756, -10.541, -42.099586964), x_dir=(-0.9510565162951528, 0, 0.3090169943749496), z_dir=(0.3090169943749496, 0, 0.9510565162951528))) as fillet6_piece_4:
        with BuildLine():
            CenterArc((10.16 - FILLET6_R, FILLET6_R), FILLET6_R, 270, 90)
            Line((10.16 - FILLET6_R, 0), (10.16, 0))
            Line((10.16, 0), (10.16, FILLET6_R))
        make_face()
    revolve(axis=Axis((-32.732691756, -10.541, -42.099586964), (0, -1, 0)), revolution_arc=72, mode=Mode.SUBTRACT)
    with BuildSketch(Plane(origin=(-20.229916049, -10.541, -3.62), x_dir=(0, 0, 1), z_dir=(1, 0, 0))) as fillet6_piece_5:
        with BuildLine():
            CenterArc((10.16 - FILLET6_R, FILLET6_R), FILLET6_R, 270, 90)
            Line((10.16 - FILLET6_R, 0), (10.16, 0))
            Line((10.16, 0), (10.16, FILLET6_R))
        make_face()
    revolve(axis=Axis((-20.229916049, -10.541, -3.62), (0, -1, 0)), revolution_arc=72, mode=Mode.SUBTRACT)
    with BuildSketch(Plane(origin=(18.184374257, -10.541, 6.54), x_dir=(0, -1, 0), z_dir=(-1, 0, 0)), Plane(origin=(42.395425962, -10.541, -38.959974301), x_dir=(0, -1, 0), z_dir=(-0.30901699437494484, 0, 0.9510565162951544))) as fillet6_piece_6:
        with BuildLine():
            CenterArc((FILLET6_R, -FILLET6_R), FILLET6_R, 90, 90)
            Line((0, -FILLET6_R), (0, 0))
            Line((0, 0), (FILLET6_R, 0))
        make_face()
    extrude(amount=38.414290306, mode=Mode.SUBTRACT)
    with BuildSketch(Plane(origin=(18.184374257, -10.541, 12.255), x_dir=(0.5526465683039506, 0, -0.8334157249187628), z_dir=(0.8334157249187628, 0, 0.5526465683039506))) as fillet6_piece_7:
        with BuildLine():
            CenterArc((5.715 + FILLET6_R, -FILLET6_R), FILLET6_R, 90, 90)
            Line((5.715 + FILLET6_R, 0), (5.715, 0))
            Line((5.715, 0), (5.715, -FILLET6_R))
        make_face()
    revolve(axis=Axis((18.184374257, -10.541, 12.255), (0, 1, 0)), revolution_arc=33.548768752, mode=Mode.SUBTRACT)
    with BuildSketch(Plane(origin=(35.960045421, -10.541, -0.659781065), x_dir=(-0.9510565162951543, 0, -0.30901699437494495), z_dir=(0.30901699437494495, 0, -0.9510565162951543))) as fillet6_piece_8:
        with BuildLine():
            CenterArc((5.715 + FILLET6_R, -FILLET6_R), FILLET6_R, 90, 90)
            Line((5.715 + FILLET6_R, 0), (5.715, 0))
            Line((5.715, 0), (5.715, -FILLET6_R))
        make_face()
    revolve(axis=Axis((35.960045421, -10.541, -0.659781065), (0, 1, 0)), revolution_arc=33.548768752, mode=Mode.SUBTRACT)
    with BuildSketch(Plane(origin=(24.664153166, -10.541, 2.483203799), x_dir=(-0.5526465683039513, 0, 0.8334157249187624), z_dir=(-0.8334157249187624, 0, -0.5526465683039513))) as fillet6_piece_9:
        with BuildLine():
            CenterArc((6.009996192 - FILLET6_R, -FILLET6_R), FILLET6_R, 0, 90)
            Line((6.009996192 - FILLET6_R, 0), (6.009996192, 0))
            Line((6.009996192, 0), (6.009996192, -FILLET6_R))
        make_face()
    revolve(axis=Axis((24.664153166, -10.541, 2.483203799), (0, 1, 0)), revolution_arc=139.097537505, mode=Mode.SUBTRACT)

    # Sketch13 → Cut-Extrude5 (cut)
    # profile 1 of 2: a face of its own
    with BuildSketch(Plane.XZ.offset(19.05)):
        with BuildLine():
            Line((20.229916049, 4.6), (-20.229916049, 4.6))
            ThreePointArc((-20.229916049, 4.6), (-25.061510822, 3.030119694), (-28.047600613, -1.079880306))
            Line((-28.047600613, -1.079880306), (-40.55037632, -39.559467271))
            ThreePointArc((-40.55037632, -39.559467271), (-40.55037632, -44.639706658), (-37.56428653, -48.749706658))
            Line((-37.56428653, -48.749706658), (-4.831594774, -72.531399275))
            ThreePointArc((-4.831594774, -72.531399275), (0, -74.101279581), (4.831594774, -72.531399275))
            Line((4.831594774, -72.531399275), (37.56428653, -48.749706658))
            ThreePointArc((37.56428653, -48.749706658), (40.55037632, -44.639706658), (40.55037632, -39.559467271))
            Line((40.55037632, -39.559467271), (28.047600613, -1.079880306))
            ThreePointArc((28.047600613, -1.079880306), (25.061510822, 3.030119694), (20.229916049, 4.6))
        make_face()
        with BuildLine():
            Line((39.97974241, -39.744877467), (27.476966703, -1.265290503))
            ThreePointArc((27.476966703, -1.265290503), (24.708839671, 2.544709497), (20.229916049, 4))
            Line((20.229916049, 4), (-20.229916049, 4))
            ThreePointArc((-20.229916049, 4), (-24.708839671, 2.544709497), (-27.476966703, -1.265290503))
            Line((-27.476966703, -1.265290503), (-39.97974241, -39.744877467))
            ThreePointArc((-39.97974241, -39.744877467), (-39.97974241, -44.454296461), (-37.211615379, -48.264296461))
            Line((-37.211615379, -48.264296461), (-4.478923622, -72.045989078))
            ThreePointArc((-4.478923622, -72.045989078), (0, -73.501279581), (4.478923622, -72.045989078))
            Line((4.478923622, -72.045989078), (37.211615379, -48.264296461))
            ThreePointArc((37.211615379, -48.264296461), (39.97974241, -44.454296461), (39.97974241, -39.744877467))
        make_face(mode=Mode.SUBTRACT)
    # profile 2 of 2: a face of its own
    with BuildSketch(Plane.XZ.offset(19.05)):
        with BuildLine():
            ThreePointArc((28.787792432, 0.145862767), (27.450253023, 6.317941272), (21.166935135, 5.682739694))
            ThreePointArc((21.166935135, 5.682739694), (25.637505825, 3.822908801), (28.787792432, 0.145862767))
        make_face()
    extrude(amount=-CUT_EXTRUDE5_DEPTH, mode=Mode.SUBTRACT)


solid = part.part
